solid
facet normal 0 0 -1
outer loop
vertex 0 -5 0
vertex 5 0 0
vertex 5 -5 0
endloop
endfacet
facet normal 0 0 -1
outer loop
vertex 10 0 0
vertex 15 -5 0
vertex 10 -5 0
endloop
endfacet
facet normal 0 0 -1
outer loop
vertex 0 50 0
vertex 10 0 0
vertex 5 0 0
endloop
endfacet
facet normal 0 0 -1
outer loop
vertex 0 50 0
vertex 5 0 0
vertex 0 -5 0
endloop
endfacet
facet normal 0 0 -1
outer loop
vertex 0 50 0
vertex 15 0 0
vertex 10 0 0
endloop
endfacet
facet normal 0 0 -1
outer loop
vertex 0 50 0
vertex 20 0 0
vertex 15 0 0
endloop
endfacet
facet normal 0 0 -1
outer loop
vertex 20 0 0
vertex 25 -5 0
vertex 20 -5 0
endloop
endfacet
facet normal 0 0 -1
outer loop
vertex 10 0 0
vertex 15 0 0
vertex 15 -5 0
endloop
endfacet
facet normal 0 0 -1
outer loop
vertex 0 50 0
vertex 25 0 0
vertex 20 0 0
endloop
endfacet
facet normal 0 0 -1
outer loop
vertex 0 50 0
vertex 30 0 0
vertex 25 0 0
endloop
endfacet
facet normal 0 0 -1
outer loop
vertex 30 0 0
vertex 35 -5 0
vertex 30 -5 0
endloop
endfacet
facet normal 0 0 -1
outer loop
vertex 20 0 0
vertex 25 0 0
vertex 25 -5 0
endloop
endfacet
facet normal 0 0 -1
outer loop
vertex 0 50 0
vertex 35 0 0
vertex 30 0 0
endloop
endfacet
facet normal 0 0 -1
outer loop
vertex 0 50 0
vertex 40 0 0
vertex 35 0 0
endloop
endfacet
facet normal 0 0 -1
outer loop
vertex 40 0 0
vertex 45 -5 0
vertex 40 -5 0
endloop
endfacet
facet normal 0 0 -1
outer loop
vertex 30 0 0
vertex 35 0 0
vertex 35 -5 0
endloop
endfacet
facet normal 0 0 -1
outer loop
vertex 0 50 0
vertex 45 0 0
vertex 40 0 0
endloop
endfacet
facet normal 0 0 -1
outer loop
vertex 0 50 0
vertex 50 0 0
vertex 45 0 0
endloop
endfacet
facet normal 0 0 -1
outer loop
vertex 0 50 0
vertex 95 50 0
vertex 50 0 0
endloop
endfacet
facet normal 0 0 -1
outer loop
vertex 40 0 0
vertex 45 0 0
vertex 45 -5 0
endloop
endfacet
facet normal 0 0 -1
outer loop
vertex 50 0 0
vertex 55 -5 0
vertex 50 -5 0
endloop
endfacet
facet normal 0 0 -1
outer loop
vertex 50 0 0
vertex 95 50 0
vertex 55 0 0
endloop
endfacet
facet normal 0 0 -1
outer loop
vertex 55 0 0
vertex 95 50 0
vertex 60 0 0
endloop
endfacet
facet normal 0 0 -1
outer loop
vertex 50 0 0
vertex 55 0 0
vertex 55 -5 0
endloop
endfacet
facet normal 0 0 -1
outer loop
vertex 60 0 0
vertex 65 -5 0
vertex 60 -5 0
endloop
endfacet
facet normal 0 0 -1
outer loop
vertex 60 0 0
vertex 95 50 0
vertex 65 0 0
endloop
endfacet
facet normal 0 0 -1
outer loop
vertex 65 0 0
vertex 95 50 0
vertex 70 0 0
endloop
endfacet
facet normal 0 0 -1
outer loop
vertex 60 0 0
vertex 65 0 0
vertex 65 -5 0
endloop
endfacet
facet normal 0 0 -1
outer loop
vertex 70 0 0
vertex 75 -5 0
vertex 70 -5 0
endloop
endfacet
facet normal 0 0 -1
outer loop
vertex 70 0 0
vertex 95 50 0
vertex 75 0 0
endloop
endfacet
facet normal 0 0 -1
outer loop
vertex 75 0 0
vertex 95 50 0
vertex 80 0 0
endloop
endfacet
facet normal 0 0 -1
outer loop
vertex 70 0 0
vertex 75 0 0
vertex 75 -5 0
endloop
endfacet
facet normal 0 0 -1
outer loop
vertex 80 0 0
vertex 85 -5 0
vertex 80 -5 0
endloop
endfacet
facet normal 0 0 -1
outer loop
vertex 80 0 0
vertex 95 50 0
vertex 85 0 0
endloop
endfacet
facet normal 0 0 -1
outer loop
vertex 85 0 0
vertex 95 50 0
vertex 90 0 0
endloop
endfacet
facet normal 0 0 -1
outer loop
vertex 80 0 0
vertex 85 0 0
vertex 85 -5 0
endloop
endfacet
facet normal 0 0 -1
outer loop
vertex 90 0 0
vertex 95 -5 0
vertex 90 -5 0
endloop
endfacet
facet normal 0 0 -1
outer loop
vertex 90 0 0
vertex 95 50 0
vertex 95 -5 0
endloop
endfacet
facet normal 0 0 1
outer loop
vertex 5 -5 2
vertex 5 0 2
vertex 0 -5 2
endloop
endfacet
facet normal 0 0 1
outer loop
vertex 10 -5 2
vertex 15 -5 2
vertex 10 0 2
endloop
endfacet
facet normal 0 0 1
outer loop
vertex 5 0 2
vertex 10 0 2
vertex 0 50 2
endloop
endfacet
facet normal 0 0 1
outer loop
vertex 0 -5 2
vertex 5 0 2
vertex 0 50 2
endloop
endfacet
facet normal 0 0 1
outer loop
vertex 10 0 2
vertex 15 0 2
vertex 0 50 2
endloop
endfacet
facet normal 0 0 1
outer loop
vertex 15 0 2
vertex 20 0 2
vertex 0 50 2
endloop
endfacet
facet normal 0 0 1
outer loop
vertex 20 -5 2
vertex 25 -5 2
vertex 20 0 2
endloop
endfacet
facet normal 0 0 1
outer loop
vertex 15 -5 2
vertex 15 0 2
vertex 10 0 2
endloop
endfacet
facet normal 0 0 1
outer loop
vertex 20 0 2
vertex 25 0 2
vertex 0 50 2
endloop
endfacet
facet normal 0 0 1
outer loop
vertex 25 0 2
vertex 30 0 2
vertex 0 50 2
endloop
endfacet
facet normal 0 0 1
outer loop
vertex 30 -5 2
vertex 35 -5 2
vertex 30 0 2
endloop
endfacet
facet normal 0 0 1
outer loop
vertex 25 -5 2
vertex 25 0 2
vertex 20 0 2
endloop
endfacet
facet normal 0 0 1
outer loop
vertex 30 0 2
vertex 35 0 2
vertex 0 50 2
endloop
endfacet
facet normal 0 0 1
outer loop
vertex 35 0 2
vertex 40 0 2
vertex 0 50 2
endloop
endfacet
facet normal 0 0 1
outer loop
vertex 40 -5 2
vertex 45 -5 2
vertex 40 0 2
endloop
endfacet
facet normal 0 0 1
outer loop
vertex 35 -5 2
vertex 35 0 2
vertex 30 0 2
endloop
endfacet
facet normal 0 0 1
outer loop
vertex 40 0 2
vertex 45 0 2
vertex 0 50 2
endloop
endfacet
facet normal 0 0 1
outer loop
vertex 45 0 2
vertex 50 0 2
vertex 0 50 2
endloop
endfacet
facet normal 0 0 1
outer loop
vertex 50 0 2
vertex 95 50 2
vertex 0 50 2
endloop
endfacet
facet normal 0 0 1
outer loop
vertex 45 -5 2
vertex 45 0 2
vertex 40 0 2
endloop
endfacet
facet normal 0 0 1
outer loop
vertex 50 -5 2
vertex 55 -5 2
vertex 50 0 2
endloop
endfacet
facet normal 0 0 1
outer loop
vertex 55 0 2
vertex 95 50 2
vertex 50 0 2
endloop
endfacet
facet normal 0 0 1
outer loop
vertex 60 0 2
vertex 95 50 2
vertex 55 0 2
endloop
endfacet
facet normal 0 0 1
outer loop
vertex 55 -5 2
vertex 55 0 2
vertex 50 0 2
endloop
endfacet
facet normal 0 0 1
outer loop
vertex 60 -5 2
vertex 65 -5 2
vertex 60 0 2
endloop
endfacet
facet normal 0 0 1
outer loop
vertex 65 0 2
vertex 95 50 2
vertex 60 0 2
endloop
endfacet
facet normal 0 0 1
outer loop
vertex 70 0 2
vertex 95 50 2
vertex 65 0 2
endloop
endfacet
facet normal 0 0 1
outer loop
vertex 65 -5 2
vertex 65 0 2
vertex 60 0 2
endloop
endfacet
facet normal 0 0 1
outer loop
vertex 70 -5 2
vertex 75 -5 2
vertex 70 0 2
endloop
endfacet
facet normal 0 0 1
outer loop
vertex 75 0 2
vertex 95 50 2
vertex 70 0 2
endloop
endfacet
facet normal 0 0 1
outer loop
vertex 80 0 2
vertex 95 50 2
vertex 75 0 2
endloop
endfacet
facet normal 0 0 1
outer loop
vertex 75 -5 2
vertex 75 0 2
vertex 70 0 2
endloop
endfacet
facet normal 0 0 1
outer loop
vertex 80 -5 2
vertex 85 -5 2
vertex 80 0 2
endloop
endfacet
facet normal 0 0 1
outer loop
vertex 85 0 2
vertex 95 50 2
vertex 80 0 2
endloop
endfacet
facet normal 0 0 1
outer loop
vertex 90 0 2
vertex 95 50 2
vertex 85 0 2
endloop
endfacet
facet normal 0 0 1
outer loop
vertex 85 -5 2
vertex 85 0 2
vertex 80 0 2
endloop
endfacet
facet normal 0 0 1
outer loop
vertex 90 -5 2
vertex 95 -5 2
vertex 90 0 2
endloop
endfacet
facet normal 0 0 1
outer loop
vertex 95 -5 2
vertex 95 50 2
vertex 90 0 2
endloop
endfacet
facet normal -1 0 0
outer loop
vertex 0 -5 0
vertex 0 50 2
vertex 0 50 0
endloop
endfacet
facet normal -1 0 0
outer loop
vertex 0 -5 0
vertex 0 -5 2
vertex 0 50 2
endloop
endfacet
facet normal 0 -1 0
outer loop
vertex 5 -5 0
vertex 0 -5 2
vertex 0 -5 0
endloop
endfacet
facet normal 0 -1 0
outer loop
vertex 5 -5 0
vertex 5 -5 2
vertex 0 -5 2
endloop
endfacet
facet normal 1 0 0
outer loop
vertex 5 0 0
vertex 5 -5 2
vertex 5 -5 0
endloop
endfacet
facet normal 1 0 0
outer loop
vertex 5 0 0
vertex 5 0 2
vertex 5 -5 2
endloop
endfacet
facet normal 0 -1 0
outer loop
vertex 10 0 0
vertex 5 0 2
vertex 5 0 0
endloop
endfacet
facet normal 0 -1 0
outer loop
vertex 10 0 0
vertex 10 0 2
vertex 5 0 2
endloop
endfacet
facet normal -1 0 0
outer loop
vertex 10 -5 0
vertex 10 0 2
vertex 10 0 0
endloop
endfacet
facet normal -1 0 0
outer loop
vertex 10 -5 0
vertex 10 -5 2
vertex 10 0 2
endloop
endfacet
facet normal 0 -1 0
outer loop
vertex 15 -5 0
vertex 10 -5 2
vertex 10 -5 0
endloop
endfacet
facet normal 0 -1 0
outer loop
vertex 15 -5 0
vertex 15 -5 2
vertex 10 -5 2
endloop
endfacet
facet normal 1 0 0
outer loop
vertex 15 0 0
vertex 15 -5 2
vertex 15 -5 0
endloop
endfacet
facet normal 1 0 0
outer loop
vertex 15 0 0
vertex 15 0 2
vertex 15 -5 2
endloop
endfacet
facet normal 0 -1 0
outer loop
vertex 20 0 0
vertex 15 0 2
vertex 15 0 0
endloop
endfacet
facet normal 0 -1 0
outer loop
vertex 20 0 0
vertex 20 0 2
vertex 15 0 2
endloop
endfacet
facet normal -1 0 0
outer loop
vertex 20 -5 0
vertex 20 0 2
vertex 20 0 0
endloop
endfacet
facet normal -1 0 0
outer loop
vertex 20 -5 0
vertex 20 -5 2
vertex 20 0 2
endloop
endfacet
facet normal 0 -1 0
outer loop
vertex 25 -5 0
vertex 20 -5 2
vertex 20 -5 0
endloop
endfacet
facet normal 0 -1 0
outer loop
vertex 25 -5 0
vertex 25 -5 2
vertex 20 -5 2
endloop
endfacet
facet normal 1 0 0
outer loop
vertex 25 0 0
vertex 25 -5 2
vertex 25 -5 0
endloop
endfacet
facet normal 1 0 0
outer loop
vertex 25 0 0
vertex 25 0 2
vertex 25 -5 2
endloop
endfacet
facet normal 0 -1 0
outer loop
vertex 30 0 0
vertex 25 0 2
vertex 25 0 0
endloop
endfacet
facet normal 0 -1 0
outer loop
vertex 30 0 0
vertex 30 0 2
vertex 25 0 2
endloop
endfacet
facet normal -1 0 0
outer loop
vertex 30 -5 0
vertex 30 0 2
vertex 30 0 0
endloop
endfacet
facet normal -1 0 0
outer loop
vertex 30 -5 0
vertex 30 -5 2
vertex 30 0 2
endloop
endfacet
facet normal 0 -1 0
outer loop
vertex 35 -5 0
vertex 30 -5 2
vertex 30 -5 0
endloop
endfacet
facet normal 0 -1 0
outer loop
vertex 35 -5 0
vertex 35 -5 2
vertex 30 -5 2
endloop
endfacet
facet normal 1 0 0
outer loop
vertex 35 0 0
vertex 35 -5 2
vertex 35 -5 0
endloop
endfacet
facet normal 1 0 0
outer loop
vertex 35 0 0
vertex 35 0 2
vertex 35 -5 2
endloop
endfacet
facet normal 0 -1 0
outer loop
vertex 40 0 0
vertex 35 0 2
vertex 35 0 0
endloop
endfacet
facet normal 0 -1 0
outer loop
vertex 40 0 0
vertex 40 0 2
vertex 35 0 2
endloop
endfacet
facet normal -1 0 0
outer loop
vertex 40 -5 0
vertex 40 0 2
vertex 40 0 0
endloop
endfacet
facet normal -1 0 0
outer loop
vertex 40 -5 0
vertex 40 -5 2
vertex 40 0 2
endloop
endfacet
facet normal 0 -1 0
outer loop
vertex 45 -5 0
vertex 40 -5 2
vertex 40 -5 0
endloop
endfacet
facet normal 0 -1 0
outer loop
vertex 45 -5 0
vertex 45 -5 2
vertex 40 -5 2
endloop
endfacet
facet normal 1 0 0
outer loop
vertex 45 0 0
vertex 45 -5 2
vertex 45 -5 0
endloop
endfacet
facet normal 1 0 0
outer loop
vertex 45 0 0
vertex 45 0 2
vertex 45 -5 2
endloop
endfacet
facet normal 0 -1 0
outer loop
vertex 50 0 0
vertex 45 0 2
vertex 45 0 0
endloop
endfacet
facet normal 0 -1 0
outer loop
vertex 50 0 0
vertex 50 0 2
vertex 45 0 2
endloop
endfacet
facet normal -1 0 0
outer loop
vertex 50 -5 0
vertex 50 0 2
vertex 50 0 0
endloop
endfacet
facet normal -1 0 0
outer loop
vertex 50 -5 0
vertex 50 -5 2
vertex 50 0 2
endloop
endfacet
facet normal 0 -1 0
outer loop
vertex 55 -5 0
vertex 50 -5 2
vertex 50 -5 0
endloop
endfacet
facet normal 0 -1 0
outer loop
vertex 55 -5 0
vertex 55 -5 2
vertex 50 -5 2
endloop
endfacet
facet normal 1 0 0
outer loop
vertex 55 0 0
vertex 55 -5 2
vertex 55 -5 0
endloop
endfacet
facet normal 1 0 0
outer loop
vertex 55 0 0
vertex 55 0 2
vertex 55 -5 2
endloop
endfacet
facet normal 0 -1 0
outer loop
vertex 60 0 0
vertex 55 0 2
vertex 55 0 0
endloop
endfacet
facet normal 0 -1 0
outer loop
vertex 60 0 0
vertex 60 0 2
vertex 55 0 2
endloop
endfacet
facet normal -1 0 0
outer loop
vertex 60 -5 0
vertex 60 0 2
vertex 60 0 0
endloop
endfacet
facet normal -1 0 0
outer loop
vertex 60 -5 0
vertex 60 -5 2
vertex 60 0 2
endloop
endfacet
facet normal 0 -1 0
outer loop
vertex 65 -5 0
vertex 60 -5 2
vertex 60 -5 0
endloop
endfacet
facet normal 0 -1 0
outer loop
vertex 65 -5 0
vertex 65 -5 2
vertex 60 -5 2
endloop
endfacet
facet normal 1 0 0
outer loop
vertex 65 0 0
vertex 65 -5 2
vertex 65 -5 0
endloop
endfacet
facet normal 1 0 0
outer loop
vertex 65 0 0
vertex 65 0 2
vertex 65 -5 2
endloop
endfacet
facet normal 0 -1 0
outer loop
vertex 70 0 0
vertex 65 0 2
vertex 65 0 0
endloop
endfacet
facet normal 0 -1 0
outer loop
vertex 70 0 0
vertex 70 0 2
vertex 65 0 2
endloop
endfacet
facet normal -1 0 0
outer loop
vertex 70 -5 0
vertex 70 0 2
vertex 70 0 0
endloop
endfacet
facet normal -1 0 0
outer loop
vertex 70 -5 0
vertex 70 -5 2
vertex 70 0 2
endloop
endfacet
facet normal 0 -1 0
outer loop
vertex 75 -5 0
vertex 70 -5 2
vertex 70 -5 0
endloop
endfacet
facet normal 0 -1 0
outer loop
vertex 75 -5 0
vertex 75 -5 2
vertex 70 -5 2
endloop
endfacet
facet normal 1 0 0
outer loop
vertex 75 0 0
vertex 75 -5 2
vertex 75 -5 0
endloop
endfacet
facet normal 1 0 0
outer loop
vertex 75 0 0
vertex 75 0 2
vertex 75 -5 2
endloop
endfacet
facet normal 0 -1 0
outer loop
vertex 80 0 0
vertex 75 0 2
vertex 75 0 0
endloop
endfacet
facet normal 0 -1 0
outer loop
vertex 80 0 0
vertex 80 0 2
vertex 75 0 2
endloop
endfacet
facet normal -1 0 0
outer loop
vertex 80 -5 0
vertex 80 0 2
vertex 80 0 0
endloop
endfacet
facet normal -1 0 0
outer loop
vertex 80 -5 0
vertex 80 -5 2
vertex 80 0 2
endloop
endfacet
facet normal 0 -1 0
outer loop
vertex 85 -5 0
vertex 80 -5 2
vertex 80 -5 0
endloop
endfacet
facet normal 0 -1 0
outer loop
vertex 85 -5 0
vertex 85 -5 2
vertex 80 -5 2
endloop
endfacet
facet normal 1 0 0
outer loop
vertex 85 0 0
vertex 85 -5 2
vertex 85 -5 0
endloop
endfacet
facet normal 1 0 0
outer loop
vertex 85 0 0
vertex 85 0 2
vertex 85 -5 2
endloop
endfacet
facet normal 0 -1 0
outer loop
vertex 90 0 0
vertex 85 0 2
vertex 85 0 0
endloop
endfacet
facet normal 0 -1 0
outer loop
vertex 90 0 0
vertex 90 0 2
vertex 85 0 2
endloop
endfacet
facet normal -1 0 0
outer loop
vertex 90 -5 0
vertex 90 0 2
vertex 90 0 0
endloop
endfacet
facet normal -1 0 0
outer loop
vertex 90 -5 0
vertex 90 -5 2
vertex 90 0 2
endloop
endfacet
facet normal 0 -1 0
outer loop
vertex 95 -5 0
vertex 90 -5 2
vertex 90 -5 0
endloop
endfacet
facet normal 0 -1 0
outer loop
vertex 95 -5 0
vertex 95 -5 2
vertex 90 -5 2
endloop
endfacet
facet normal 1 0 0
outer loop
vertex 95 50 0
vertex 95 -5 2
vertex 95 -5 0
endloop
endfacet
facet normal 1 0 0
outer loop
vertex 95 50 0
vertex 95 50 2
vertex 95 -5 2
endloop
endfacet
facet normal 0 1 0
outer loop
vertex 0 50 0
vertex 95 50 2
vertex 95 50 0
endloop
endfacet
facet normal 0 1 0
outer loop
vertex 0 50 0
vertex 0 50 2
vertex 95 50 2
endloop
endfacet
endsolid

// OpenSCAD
module comb( teeth=10, width=5, depth=5, height=50, thickness=2 )
{
	linear_extrude( thickness ) {
		square( [width * 2 * teeth - width, height] );
		for ( i = [0:teeth-1] ) {
			translate( [i*width*2,-depth] ) square( [width, depth+1] );
		}
	}
}

comb();
